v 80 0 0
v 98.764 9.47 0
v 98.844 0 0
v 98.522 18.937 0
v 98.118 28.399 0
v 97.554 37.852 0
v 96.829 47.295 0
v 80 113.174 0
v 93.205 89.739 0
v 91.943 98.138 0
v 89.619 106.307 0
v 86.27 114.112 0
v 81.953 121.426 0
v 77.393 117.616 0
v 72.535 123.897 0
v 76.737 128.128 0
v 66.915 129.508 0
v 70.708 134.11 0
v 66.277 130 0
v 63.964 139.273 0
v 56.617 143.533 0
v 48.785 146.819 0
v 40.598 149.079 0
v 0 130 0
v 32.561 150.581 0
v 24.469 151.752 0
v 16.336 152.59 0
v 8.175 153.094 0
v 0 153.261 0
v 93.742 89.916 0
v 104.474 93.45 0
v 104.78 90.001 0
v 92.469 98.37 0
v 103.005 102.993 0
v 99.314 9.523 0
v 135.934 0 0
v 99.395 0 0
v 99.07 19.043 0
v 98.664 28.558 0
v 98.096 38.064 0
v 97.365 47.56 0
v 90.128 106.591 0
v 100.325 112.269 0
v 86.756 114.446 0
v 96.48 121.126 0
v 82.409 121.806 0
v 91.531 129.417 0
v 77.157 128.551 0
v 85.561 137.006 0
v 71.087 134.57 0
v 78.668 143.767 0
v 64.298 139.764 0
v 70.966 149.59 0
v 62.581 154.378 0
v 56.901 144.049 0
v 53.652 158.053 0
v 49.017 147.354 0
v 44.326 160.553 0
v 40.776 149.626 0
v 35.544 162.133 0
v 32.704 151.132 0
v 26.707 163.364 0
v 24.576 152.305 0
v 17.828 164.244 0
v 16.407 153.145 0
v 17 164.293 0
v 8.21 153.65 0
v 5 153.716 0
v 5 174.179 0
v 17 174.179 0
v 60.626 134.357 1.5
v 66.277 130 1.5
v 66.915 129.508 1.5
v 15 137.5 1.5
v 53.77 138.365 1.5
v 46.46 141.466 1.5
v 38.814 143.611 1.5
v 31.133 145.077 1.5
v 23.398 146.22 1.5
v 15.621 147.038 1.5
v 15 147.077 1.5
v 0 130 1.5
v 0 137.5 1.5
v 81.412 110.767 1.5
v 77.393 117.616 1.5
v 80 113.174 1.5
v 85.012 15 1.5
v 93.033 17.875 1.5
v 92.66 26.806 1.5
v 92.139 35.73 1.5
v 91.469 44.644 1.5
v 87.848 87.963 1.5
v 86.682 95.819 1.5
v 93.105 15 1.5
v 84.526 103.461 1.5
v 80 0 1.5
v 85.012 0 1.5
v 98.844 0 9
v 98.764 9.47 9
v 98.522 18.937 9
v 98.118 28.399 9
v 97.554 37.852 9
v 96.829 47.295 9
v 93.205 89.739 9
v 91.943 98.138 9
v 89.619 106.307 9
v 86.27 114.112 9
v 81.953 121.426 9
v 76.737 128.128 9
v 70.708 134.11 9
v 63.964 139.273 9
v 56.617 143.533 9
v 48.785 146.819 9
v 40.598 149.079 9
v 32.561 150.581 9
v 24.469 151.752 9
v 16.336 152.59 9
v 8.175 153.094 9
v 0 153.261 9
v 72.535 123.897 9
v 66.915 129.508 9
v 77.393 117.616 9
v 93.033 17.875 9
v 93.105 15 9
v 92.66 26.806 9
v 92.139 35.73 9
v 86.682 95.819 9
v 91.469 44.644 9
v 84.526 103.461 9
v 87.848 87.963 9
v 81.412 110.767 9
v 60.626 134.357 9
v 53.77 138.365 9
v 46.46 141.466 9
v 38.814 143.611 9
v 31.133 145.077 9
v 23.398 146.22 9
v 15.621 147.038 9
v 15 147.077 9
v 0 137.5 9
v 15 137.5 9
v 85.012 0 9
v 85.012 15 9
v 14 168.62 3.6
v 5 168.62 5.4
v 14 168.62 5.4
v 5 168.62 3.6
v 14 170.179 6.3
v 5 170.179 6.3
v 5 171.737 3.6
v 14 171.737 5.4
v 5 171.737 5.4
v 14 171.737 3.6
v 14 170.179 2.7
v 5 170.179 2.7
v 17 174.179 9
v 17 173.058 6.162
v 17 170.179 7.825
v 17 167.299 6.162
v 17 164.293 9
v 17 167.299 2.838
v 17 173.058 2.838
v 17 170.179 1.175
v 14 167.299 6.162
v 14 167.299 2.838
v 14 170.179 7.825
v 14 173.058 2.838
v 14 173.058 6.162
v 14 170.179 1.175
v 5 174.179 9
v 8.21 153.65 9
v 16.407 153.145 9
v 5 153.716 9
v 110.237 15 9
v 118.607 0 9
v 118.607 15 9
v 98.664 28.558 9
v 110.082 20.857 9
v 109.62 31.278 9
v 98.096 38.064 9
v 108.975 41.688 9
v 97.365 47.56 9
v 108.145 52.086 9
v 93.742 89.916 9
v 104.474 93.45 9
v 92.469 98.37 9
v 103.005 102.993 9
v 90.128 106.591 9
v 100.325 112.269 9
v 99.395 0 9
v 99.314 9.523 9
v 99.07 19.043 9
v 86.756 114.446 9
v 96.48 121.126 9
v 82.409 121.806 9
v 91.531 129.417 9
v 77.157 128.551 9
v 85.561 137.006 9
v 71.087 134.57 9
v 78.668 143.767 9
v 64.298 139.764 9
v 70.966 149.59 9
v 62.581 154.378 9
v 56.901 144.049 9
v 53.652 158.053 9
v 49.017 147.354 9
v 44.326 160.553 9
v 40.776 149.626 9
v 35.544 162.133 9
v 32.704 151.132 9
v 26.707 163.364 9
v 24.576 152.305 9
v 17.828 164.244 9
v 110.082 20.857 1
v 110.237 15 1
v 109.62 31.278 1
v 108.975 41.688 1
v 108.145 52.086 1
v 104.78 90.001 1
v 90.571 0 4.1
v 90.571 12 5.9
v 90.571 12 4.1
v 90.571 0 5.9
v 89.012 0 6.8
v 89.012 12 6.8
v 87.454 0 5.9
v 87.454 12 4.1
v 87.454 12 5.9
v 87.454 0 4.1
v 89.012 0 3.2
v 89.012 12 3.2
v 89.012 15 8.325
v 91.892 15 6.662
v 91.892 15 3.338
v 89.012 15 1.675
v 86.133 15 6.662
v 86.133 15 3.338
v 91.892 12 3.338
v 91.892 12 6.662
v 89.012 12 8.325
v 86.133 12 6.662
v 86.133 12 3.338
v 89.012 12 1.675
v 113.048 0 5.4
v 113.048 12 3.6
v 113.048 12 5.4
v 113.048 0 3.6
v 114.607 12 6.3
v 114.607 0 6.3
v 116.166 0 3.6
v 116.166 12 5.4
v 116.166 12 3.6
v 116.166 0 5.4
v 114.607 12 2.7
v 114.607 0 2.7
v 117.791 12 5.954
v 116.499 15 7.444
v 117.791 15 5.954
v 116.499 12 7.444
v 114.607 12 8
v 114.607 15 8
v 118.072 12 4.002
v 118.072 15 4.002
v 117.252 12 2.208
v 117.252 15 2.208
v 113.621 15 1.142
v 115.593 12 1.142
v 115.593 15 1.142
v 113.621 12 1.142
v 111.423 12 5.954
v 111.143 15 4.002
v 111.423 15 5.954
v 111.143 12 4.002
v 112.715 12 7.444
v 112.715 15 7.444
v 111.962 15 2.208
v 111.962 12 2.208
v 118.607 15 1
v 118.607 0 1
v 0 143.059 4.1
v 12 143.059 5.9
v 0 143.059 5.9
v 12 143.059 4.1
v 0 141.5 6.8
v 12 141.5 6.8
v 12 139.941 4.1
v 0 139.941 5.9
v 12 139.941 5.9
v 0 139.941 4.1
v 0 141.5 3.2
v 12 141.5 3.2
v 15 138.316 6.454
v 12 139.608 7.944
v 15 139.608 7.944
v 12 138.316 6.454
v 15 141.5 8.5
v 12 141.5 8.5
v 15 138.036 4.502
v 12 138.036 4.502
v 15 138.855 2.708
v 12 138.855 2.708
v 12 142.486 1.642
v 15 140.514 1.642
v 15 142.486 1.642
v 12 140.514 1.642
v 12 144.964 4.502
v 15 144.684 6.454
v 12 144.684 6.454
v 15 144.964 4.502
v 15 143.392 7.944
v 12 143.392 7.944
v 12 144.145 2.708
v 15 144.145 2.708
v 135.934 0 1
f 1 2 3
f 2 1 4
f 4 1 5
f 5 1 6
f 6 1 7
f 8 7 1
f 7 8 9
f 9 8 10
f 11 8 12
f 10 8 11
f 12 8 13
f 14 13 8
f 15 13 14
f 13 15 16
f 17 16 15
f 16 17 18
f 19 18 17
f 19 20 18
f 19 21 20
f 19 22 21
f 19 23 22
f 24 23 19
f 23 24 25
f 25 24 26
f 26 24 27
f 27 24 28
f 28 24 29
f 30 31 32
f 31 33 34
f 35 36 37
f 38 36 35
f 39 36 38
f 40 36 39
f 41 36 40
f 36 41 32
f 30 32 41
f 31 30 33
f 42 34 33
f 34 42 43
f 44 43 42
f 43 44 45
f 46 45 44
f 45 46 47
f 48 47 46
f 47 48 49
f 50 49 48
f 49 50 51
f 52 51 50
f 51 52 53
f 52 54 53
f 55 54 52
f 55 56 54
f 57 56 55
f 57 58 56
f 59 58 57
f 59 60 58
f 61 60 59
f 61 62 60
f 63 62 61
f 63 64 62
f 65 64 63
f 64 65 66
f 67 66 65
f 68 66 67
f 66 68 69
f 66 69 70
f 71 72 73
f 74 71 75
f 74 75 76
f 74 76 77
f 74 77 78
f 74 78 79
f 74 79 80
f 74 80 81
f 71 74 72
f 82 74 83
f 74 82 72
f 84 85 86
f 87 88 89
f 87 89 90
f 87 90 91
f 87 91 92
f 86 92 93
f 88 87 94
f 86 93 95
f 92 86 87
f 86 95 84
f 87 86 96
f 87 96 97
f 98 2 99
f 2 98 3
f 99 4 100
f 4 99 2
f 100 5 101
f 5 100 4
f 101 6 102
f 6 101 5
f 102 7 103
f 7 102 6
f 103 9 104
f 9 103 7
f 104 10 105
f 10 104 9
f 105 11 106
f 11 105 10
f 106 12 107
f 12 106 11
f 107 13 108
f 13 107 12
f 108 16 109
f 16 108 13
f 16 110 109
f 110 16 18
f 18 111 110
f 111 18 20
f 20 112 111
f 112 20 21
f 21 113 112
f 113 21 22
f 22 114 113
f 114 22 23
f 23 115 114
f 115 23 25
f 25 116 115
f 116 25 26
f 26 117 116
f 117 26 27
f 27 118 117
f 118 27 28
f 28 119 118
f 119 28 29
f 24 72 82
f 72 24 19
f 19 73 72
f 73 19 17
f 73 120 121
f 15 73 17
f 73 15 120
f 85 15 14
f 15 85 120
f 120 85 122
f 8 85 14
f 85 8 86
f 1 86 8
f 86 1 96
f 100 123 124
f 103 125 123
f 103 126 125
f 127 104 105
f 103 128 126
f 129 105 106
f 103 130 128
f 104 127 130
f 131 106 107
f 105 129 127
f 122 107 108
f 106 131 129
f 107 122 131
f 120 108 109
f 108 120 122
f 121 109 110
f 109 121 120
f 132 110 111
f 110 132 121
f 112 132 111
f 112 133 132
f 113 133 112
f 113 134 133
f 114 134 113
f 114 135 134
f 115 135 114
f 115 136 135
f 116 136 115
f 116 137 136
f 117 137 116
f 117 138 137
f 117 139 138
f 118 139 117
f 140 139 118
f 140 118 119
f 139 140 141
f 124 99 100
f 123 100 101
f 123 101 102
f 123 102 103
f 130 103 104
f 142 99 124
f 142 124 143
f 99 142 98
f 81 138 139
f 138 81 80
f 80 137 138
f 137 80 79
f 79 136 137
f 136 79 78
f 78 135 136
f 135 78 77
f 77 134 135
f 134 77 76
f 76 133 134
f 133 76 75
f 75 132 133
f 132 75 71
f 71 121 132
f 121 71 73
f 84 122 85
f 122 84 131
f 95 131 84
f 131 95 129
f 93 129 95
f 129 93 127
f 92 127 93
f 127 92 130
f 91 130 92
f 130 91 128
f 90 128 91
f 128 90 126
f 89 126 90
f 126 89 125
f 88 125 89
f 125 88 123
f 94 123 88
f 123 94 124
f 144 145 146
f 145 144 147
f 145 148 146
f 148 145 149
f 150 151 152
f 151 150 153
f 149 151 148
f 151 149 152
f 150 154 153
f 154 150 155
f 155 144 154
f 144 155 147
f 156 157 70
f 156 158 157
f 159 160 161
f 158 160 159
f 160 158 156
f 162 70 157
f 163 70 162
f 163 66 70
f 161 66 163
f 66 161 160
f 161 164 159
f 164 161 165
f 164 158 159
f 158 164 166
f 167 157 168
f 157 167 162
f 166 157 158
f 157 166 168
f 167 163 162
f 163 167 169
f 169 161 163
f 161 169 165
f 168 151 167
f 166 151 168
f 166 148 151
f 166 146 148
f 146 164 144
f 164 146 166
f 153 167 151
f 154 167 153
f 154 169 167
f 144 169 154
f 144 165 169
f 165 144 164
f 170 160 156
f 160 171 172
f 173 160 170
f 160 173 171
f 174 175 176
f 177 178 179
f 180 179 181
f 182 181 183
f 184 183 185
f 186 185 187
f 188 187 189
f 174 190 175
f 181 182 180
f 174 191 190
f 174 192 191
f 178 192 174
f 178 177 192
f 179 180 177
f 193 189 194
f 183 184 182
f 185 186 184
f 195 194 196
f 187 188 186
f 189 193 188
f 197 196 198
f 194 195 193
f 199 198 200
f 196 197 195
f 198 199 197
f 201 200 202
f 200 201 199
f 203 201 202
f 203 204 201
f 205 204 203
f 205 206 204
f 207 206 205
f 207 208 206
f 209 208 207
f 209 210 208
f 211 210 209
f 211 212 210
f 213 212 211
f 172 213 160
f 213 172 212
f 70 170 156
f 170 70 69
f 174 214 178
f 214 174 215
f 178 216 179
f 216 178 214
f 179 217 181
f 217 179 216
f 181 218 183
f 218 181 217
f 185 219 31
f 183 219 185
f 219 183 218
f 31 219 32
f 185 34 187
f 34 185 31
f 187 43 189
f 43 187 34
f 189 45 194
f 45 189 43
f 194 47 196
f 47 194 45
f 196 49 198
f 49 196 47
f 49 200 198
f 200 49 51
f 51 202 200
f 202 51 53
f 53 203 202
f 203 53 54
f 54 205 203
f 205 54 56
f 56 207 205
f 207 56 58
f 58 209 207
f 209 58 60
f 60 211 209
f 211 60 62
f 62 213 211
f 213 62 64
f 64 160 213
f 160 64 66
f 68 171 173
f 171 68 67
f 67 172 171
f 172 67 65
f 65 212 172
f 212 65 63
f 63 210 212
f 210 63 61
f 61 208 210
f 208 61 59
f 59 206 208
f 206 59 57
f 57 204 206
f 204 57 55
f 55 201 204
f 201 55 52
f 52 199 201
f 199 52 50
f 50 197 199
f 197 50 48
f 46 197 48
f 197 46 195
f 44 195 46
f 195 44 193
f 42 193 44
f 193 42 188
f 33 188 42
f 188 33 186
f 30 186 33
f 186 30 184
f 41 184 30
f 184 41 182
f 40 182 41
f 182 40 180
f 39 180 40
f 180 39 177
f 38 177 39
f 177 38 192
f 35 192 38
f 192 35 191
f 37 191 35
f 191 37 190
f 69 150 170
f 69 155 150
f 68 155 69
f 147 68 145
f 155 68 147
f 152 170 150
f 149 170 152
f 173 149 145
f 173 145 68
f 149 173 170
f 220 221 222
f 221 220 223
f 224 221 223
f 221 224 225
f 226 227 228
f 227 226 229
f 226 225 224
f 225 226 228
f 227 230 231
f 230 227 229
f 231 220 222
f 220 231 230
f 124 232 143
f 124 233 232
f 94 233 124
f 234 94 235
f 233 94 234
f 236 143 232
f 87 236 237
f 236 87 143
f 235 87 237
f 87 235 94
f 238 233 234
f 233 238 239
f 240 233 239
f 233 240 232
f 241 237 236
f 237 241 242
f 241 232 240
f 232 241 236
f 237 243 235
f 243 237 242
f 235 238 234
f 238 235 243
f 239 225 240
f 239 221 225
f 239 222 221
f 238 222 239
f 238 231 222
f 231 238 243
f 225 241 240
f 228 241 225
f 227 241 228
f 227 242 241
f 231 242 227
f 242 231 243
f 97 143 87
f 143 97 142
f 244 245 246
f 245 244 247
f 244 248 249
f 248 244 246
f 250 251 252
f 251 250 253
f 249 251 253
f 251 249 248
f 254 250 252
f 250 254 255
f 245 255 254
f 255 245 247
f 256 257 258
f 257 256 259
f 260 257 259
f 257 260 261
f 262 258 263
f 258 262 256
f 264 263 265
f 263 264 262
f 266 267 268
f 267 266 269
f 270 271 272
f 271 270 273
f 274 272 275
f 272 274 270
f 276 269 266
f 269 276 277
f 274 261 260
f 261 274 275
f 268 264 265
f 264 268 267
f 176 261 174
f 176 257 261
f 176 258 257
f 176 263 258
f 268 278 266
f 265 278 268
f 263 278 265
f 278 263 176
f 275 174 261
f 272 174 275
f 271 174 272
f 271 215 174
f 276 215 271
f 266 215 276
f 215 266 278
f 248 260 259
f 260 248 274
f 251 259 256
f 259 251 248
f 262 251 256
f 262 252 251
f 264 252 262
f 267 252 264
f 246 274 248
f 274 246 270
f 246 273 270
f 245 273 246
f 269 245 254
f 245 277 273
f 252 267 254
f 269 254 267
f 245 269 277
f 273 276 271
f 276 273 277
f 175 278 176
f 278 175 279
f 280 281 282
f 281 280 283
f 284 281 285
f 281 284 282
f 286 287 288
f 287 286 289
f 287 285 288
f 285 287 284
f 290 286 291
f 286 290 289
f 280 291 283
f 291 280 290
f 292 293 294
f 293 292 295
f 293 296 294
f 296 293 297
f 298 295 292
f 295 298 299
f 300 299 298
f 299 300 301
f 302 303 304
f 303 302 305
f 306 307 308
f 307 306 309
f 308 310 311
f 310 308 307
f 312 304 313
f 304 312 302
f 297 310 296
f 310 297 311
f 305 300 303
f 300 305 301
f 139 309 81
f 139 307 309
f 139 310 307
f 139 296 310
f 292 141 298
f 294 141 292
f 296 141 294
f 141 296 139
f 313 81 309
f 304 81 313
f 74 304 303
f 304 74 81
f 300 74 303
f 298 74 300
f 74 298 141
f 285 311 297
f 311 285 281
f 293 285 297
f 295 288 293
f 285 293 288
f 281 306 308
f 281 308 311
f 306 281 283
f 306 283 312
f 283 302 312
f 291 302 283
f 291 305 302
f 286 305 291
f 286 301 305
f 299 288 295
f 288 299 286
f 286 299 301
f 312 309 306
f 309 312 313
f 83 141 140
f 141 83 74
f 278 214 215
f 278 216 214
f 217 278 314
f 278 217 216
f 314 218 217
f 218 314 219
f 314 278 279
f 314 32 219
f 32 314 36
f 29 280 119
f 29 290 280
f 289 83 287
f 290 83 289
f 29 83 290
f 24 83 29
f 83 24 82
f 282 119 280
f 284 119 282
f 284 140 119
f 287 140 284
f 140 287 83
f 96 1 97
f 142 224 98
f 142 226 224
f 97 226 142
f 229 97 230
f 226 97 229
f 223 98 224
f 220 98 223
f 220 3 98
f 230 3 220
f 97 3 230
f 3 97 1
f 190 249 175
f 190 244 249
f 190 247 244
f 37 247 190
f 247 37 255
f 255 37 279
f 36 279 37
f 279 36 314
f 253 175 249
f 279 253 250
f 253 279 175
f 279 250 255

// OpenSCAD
// file: hoop.scad
use <polyround.scad>;

// NOTE: consider losses (presser foot size) on corners when setting workarea dimensions
// print with infill above 60% for better stiffness
// this default workarea 130x150 needes 200x200 printer platform space
hoop(workareaWidth = 130, workareaHeight = 150);

// smaller hoops
//hoop(workareaWidth = 80, workareaHeight = 100);
//hoop(workareaWidth = 60, workareaHeight = 80);


innerOuterFramesSpacing = 0.5;
mountingHolesSpacing = 40;

module hoop(workareaWidth = 130, workareaHeight = 150, frameHeight = 8, innerFrameThickness = 3, outerFrameThickness = 5, roundness = 5, tightenerSpace = 3, sizeOffset = 0, withHandle = true, partsMode = 3)
{
    innerFrameWidth = workareaWidth+innerFrameThickness*2+sizeOffset;
    innerFrameHeight = workareaHeight+innerFrameThickness*2+sizeOffset;
    // inner frame
    if (partsMode == 3 || partsMode == 1)
    {    
    linear_extrude(height = 1.5) difference(){
        roundRectangle(innerFrameWidth, innerFrameHeight, roundness, center=true);
        intersection(){
            roundRectangle(workareaWidth+sizeOffset, workareaHeight+sizeOffset, roundness, center=true);
            square(size=[workareaWidth, workareaHeight], center=true);
        }
    }
    linear_extrude(height = frameHeight) difference(){
        roundRectangle(innerFrameWidth, innerFrameHeight, roundness, center=true);
        roundRectangle(workareaWidth+sizeOffset, workareaHeight+sizeOffset, roundness, center=true);
    }
    }
    // outer frame
    if (partsMode == 3 || partsMode == 2)
    {
    spacing = innerOuterFramesSpacing*2;
    outerFrameWidth = innerFrameWidth+outerFrameThickness*2+spacing;
    outerFrameHeight =  innerFrameHeight+outerFrameThickness*2+spacing;
    difference(){
    union(){
        linear_extrude(height = frameHeight) difference(){
            roundRectangle(outerFrameWidth , outerFrameHeight, roundness, center=true);
            roundRectangle(innerFrameWidth+spacing, innerFrameHeight+spacing, roundness,  center=true);
    }
    // tightening handle
        // adjust magic number divider to elminate gap between frame and handle
        translate([-9,outerFrameHeight/28+3/roundness+outerFrameHeight/2,0]) 
        difference(){
            tightnWidth = 20+tightenerSpace;
            cube([tightnWidth ,12,frameHeight]);
            //screw hole
            translate([tightnWidth,8,frameHeight/2]) rotate([0,-90,0]) {cylinder(r=1.8, h=tightnWidth+1); cylinder(r=3.5*0.95, h=3, $fn=6);}
            }
        }
        translate([-1,0,0]) cube([tightenerSpace,innerFrameHeight,frameHeight]);
    }
    // outer frame handle
    if (withHandle)
        translate([outerFrameWidth/15+ innerFrameWidth/2,0,0]) {
            handle(frameHeight);
        }
    }
}

module handle(frameHeight)
{
    difference(){
        union(){
            translate([0,-20,0]) cube([40,40,frameHeight/2]);
            
            translate([36,-(mountingHolesSpacing+10)/2,0]) hull(){
                cube([4,mountingHolesSpacing+10,6+frameHeight/2]);
                translate([-10,0,0])cube([10,mountingHolesSpacing+10,1]);
            }
        }
        // mounting holes
        for(i=[1,-1])
            translate([0,i*mountingHolesSpacing/2,3+frameHeight/2]) rotate([0,90,0]){ 
            cylinder(r=5.5, h=36); cylinder(r=1.8, h=41);
            }
    }
}

module roundRectangle(width=20, height=25, roundness = 5, center = false)
{
  // those two values bellow affects roundness of the frames
  divider = 15;
  cornerR = min([width,height])/roundness;
  
  points=[
    [0,                    0,                      cornerR],
    [-width/divider,       height/2,               height*2],
    [0,                    height,                 cornerR],
    [width/2,              height+height/divider,  width*2],
    [width,                height,                 cornerR],
    [width+width/divider,  height/2,               height*2],
    [width,                0,                      cornerR],
    [width/2,              -height/divider,        width*2]
  ];
  
  if(center){
     translate([-width/2, -height/2,0])  polygon(polyRound(points,10));
   }
   else{
       polygon(polyRound(points,10));
   }
      
     
 }
// main file
use <hoop.scad>

// some of the coordinates were set in messy way
// be careful when changing area size and correct things when needed
workareaWidth = 160;
workareaHeight = 260;

frameHeight = 9;
innerFrameThickness = 5;
outerFrameThickness = 10;

// print all quarters from 0 to 3
// infill at least 50%
hoop_quarter(0);


//hoop_large();

module hoop_large()
{
    sizeOffset = 8;
    innerFrameWidth = workareaWidth+innerFrameThickness*2+sizeOffset;
    innerFrameHeight = workareaHeight+innerFrameThickness*2+sizeOffset;
    spacing = 0.5*2;
    outerFrameWidth = innerFrameWidth+outerFrameThickness*2+spacing;
    outerFrameHeight =  innerFrameHeight+outerFrameThickness*2+spacing;
    
    
    hoop(workareaWidth, workareaHeight, frameHeight, innerFrameThickness, outerFrameThickness, 
    roundness = 1.5, 
    tightenerSpace = 6, 
    sizeOffset = sizeOffset, 
    withHandle = false
  );
    
    // here connectors are placed
    // its offsets (bigger magic numbers) position is hardcoded by trial, messy way  
    for (pos = [[1,0],[-1,0],[0,1],[0,-1]])
        {
            // inner frame connectors
           translate([(outerFrameWidth/2 - outerFrameWidth/80)*pos[0],(outerFrameHeight/2 + 0)*pos[1],0])
           if(pos != [0,1]) rotate([0,0,90*pos[0]]) connector(0.5);
           else rotate([0,0,180]) connector(0.5);
               
            // outer frame connectors
           translate([(outerFrameWidth/2 + outerFrameWidth/28)*pos[0],(outerFrameHeight/2 + outerFrameHeight/26)*pos[1],0])
           if(pos != [0,1]) rotate([0,0,180+90*pos[0]]) connector();
        }
     
    // mounting handle
    translate([workareaWidth/2+workareaWidth/7, -40]) 
    {
        linear_extrude(height=2) polygon([[-10,-80],[40,-20],[0,0]]);
        linear_extrude(height=1.0) polygon([[0,0],[40,20],[-5,150]]);
        handle(frameHeight);
    }
}

module hoop_quarter(index)
{
    quarters = [[1,1],[-1,1],[-1,-1],[1,-1]];
    x = quarters[index][0];
    y = quarters[index][1];
    intersection(){
        scale([x,y,1]) cube([workareaWidth ,workareaHeight,frameHeight+10]);
        hoop_large();
    }
}

module connector(holeHoffset = 0)
{
    tightnWidth = 30;
    translate([-tightnWidth/2,0,0]) difference(){
        cube([tightnWidth ,12,frameHeight]);
        //screw hole
        translate([tightnWidth,8,frameHeight/2+holeHoffset]) rotate([0,-90,0]) 
        {        
            cylinder(r=1.8, h=tightnWidth+1); cylinder(r=3.5*0.95, h=3, $fn=6);
            translate([0,0,tightnWidth-3]) cylinder(r=3.5, h=3);
        }
    }
}
